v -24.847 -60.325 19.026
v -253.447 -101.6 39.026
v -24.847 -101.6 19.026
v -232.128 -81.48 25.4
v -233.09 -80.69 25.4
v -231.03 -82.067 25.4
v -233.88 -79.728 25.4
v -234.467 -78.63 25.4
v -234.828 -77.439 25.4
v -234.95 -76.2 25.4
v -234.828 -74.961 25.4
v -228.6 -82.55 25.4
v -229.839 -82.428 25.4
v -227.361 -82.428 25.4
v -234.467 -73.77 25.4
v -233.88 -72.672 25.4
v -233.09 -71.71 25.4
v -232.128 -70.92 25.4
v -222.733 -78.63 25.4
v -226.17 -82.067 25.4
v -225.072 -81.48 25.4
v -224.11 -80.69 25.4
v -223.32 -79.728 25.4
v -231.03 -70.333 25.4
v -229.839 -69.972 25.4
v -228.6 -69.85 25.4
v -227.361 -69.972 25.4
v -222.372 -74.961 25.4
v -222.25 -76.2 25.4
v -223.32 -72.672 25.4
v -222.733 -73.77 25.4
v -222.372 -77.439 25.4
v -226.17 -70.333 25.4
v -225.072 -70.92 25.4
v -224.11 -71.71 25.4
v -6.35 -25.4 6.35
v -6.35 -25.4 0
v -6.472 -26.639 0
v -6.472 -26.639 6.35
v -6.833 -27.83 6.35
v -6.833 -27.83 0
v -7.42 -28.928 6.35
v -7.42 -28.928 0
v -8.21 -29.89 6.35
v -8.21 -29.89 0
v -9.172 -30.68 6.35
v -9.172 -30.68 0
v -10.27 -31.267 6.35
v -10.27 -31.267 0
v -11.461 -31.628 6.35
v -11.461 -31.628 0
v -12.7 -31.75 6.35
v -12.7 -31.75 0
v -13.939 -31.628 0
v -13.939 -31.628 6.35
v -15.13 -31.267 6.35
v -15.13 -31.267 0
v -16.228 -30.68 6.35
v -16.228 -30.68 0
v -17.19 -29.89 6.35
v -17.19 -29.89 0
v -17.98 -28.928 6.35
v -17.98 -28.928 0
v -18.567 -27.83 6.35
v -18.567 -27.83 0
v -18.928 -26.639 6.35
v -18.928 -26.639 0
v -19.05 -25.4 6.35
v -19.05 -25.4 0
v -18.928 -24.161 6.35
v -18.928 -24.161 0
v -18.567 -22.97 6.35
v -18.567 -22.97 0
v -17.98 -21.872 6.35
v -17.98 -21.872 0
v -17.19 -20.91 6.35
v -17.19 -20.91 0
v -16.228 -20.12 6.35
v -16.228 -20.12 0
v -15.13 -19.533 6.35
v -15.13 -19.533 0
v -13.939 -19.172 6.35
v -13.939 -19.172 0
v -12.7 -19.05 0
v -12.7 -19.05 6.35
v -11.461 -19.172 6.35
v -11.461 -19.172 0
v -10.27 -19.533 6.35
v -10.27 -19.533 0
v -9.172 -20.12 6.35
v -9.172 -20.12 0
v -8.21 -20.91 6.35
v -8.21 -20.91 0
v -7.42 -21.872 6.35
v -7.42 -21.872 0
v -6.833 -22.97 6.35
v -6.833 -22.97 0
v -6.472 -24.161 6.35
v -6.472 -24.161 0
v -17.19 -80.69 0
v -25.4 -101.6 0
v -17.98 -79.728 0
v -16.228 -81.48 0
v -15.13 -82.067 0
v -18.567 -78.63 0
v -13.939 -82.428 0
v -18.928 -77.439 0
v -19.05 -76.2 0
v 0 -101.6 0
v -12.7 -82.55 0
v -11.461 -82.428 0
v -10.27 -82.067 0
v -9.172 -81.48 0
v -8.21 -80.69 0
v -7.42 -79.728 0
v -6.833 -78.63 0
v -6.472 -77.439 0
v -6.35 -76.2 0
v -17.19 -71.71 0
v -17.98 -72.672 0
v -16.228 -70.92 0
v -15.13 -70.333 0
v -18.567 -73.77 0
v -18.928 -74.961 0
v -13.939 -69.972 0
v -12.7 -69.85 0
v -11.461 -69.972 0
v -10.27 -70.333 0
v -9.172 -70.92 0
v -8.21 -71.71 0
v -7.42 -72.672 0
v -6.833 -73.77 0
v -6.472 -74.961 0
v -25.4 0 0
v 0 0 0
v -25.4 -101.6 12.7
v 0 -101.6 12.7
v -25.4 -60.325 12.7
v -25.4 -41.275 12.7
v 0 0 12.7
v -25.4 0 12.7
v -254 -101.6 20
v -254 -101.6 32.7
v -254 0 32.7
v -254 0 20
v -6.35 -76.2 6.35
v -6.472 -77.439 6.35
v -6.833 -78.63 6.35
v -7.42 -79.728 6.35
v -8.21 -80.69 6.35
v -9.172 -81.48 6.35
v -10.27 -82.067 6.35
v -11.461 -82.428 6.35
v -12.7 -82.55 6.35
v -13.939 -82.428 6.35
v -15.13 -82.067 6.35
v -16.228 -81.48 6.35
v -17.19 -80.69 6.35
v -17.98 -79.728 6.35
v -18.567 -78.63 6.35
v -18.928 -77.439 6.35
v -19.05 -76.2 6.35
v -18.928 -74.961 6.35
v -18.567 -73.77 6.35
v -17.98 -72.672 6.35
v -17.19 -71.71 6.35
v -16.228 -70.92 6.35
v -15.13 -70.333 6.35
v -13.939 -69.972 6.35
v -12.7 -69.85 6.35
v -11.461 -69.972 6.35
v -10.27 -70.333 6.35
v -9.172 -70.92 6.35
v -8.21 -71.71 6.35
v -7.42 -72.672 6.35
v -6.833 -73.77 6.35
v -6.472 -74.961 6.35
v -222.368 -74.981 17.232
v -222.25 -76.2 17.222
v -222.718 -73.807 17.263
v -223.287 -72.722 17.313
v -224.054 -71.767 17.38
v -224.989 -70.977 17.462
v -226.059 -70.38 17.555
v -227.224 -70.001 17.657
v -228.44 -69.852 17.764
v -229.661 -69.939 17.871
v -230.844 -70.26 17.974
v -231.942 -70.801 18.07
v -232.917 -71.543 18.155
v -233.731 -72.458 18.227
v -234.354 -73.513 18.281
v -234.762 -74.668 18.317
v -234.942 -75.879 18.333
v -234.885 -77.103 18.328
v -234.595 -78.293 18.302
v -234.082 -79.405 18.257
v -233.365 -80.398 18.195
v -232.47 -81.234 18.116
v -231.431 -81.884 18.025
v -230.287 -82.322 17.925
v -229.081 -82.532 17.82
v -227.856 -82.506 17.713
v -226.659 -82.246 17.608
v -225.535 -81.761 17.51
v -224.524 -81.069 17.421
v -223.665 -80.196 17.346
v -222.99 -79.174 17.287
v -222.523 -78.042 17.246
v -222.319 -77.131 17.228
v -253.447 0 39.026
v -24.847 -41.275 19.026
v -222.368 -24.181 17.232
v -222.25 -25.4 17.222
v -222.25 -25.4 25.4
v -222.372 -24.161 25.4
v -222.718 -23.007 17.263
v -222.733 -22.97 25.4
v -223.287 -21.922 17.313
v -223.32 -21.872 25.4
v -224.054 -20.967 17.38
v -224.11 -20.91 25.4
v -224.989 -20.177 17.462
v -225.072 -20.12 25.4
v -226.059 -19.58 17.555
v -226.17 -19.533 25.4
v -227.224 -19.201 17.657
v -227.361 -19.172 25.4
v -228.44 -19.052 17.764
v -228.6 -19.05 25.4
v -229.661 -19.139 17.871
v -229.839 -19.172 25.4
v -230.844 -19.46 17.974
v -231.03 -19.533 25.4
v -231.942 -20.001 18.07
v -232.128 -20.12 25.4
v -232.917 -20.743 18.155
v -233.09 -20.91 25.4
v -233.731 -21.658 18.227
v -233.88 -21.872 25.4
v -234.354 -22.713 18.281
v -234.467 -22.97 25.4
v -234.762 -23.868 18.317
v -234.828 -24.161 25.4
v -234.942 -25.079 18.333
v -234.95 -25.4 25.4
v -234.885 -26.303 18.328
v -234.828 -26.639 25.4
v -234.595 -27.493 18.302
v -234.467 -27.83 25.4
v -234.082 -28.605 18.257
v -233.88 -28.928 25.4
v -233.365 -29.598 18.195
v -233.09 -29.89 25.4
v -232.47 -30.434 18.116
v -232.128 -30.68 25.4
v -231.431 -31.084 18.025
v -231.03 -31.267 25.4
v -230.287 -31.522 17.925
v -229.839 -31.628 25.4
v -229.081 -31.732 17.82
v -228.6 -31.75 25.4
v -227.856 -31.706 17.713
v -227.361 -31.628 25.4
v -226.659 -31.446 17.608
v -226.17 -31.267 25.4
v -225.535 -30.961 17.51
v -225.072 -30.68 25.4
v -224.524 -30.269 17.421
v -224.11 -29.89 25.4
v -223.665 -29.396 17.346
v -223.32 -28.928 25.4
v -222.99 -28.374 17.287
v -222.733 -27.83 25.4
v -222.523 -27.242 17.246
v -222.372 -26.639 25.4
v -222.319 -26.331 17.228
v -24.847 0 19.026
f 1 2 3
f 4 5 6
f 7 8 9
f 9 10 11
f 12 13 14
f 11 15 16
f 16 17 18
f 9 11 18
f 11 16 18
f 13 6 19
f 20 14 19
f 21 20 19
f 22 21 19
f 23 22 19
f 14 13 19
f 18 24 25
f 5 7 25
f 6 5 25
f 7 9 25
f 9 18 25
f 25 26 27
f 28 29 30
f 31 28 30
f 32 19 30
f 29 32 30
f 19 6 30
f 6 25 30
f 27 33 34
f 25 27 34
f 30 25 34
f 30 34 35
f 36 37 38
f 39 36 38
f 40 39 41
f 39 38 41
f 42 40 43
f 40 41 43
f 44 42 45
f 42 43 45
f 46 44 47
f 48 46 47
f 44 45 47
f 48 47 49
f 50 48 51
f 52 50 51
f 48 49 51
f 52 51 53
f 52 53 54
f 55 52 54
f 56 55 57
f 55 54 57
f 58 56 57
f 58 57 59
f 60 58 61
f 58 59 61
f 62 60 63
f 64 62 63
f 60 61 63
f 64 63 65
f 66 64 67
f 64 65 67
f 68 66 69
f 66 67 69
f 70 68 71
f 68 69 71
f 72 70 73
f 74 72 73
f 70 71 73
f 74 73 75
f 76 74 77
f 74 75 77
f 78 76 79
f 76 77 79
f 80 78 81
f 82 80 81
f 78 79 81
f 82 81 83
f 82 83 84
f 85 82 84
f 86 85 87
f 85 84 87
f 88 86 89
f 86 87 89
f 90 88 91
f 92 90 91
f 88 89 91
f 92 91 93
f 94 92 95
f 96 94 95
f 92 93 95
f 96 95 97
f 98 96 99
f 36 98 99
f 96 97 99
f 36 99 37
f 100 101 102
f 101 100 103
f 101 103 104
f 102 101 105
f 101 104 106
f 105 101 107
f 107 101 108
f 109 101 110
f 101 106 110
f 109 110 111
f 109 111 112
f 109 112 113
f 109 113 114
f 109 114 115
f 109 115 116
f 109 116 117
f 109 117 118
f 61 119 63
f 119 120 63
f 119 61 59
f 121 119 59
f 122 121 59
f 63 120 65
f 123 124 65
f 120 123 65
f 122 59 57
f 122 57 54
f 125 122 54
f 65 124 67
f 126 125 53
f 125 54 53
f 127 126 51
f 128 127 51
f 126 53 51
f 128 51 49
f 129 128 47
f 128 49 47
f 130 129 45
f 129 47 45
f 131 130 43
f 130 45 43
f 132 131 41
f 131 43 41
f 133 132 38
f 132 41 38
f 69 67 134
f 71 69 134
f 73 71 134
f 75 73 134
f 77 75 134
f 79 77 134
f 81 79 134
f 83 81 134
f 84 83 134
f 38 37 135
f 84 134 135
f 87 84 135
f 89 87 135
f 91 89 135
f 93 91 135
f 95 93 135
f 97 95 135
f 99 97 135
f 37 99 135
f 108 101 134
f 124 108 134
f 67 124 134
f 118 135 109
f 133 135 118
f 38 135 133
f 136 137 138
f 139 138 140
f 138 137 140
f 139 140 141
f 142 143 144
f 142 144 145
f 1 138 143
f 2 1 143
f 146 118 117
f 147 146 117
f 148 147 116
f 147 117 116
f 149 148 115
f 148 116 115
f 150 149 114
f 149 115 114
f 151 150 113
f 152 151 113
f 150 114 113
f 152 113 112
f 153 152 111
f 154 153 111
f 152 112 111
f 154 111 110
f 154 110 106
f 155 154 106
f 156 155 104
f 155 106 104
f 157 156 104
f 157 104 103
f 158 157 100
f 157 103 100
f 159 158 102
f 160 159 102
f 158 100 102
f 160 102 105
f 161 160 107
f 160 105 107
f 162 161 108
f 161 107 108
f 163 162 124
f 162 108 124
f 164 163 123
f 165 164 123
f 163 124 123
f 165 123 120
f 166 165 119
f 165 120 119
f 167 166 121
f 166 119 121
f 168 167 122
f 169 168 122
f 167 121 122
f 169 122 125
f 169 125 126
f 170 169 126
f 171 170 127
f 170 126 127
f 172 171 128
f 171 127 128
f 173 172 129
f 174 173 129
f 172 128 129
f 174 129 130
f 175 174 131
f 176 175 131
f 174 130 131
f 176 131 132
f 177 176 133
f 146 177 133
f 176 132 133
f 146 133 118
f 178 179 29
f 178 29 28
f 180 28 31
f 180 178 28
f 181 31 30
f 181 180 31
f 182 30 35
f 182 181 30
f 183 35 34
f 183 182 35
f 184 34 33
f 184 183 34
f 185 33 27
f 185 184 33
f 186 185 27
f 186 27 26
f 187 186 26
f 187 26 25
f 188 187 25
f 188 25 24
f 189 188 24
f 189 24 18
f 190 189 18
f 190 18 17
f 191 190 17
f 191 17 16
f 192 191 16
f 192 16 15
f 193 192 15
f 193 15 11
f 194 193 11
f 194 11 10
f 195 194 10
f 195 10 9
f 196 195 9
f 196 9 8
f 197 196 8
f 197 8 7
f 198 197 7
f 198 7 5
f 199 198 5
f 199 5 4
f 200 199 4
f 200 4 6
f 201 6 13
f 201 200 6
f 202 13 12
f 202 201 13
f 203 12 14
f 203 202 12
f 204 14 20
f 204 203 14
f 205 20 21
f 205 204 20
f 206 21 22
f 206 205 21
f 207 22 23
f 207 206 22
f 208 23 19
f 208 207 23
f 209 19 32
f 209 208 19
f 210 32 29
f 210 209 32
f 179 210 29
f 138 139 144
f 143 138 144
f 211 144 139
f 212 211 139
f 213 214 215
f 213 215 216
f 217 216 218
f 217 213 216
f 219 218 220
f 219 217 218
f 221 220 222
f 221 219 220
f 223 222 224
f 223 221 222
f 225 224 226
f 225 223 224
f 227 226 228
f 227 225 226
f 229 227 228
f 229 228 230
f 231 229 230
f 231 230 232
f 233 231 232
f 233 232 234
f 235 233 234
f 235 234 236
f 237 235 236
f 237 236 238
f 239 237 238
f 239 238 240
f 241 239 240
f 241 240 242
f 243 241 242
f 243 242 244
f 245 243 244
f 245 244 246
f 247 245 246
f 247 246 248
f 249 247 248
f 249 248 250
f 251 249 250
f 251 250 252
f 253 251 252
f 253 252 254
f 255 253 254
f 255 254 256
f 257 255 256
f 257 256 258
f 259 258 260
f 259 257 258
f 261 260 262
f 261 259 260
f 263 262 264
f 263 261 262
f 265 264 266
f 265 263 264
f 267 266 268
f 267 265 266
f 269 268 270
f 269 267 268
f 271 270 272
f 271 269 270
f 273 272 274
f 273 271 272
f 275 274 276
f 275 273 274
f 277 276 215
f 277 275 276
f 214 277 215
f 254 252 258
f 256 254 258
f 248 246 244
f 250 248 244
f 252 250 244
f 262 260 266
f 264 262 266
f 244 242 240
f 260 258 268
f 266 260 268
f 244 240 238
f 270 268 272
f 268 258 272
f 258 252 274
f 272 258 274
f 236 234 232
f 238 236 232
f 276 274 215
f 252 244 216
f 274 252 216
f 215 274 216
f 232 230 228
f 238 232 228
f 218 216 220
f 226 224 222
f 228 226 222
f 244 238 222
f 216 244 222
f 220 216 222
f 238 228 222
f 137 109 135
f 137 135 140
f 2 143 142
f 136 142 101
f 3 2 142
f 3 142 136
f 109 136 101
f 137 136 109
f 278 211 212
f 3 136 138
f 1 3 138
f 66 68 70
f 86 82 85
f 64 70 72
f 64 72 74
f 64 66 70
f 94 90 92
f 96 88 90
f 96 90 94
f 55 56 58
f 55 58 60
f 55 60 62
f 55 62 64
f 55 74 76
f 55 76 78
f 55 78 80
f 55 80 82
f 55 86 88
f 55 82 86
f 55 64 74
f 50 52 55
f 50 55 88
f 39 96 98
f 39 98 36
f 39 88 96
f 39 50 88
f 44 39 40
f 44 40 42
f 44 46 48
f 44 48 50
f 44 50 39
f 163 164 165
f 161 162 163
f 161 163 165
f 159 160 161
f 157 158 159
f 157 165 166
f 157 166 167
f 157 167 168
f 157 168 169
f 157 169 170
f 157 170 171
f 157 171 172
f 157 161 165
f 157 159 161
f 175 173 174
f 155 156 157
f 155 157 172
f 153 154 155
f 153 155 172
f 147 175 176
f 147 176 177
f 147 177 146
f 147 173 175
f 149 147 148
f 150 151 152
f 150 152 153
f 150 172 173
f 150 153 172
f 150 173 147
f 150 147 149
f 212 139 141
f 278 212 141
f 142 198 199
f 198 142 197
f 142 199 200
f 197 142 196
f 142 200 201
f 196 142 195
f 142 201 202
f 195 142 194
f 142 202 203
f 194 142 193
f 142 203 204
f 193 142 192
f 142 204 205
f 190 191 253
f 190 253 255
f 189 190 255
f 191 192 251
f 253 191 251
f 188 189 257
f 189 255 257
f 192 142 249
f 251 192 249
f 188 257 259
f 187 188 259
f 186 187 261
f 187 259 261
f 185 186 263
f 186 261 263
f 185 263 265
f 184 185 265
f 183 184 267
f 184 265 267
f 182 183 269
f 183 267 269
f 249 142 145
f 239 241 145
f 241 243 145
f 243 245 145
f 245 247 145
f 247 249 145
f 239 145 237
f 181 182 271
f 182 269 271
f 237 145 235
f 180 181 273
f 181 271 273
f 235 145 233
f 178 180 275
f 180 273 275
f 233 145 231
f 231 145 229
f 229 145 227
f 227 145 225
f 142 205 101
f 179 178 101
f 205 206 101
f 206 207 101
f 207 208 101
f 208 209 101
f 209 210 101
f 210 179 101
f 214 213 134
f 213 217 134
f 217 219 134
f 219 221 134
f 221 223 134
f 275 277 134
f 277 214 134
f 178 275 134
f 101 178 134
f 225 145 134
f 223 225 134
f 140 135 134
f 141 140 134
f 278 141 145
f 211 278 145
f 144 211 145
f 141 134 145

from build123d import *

# Parameters (mm, degrees)
F1_DEPTH = 101.6
F3_DEPTH = 6.35
F4_R     = 6.35
F5_DEPTH = 25.4
F6_R     = 6.35
F7_DEPTH = 6.35


with BuildPart() as f1:
    # F0 (on Front) → F1 (new body)
    with BuildSketch(Plane.XZ):
        Polygon((-25.4, 0), (0, 0), (0, 12.7), (-25.4, 12.7), (-254, 32.699908482), (-254, 19.999908482), align=None)
    extrude(amount=F1_DEPTH)

    # F2 (on face) → F3 (join)
    with BuildSketch(Plane(origin=(0.9097243914, 0, 10.3981973753), x_dir=(0.9961946981, 0, -0.0871557427), z_dir=(0.0871557427, 0, 0.9961946981))):
        Polygon((-26.4102232644, 0), (-255.8834381268, 0), (-26.4102232644, -41.275), align=None)
        Polygon((-26.4102232644, -60.325), (-255.8834381268, -101.6), (-26.4102232644, -101.6), align=None)
    extrude(amount=F3_DEPTH)

    # F4 (on Top) → F5 (cut)
    with BuildSketch(Plane.XY):
        with Locations((-228.6, -25.4)):
            Circle(F4_R)
        with Locations((-228.6, -76.2)):
            Circle(F4_R)
    extrude(amount=F5_DEPTH, mode=Mode.SUBTRACT)

    # F6 (on face) → F7 (cut)
    with BuildSketch(Plane(origin=(0, 0, 0), x_dir=(1, 0, 0), z_dir=(0, 0, -1))):
        with Locations((-12.7, 25.4)):
            Circle(F6_R)
        with Locations((-12.7, 76.2)):
            Circle(F6_R)
    extrude(amount=-F7_DEPTH, mode=Mode.SUBTRACT)


solid = f1.part
